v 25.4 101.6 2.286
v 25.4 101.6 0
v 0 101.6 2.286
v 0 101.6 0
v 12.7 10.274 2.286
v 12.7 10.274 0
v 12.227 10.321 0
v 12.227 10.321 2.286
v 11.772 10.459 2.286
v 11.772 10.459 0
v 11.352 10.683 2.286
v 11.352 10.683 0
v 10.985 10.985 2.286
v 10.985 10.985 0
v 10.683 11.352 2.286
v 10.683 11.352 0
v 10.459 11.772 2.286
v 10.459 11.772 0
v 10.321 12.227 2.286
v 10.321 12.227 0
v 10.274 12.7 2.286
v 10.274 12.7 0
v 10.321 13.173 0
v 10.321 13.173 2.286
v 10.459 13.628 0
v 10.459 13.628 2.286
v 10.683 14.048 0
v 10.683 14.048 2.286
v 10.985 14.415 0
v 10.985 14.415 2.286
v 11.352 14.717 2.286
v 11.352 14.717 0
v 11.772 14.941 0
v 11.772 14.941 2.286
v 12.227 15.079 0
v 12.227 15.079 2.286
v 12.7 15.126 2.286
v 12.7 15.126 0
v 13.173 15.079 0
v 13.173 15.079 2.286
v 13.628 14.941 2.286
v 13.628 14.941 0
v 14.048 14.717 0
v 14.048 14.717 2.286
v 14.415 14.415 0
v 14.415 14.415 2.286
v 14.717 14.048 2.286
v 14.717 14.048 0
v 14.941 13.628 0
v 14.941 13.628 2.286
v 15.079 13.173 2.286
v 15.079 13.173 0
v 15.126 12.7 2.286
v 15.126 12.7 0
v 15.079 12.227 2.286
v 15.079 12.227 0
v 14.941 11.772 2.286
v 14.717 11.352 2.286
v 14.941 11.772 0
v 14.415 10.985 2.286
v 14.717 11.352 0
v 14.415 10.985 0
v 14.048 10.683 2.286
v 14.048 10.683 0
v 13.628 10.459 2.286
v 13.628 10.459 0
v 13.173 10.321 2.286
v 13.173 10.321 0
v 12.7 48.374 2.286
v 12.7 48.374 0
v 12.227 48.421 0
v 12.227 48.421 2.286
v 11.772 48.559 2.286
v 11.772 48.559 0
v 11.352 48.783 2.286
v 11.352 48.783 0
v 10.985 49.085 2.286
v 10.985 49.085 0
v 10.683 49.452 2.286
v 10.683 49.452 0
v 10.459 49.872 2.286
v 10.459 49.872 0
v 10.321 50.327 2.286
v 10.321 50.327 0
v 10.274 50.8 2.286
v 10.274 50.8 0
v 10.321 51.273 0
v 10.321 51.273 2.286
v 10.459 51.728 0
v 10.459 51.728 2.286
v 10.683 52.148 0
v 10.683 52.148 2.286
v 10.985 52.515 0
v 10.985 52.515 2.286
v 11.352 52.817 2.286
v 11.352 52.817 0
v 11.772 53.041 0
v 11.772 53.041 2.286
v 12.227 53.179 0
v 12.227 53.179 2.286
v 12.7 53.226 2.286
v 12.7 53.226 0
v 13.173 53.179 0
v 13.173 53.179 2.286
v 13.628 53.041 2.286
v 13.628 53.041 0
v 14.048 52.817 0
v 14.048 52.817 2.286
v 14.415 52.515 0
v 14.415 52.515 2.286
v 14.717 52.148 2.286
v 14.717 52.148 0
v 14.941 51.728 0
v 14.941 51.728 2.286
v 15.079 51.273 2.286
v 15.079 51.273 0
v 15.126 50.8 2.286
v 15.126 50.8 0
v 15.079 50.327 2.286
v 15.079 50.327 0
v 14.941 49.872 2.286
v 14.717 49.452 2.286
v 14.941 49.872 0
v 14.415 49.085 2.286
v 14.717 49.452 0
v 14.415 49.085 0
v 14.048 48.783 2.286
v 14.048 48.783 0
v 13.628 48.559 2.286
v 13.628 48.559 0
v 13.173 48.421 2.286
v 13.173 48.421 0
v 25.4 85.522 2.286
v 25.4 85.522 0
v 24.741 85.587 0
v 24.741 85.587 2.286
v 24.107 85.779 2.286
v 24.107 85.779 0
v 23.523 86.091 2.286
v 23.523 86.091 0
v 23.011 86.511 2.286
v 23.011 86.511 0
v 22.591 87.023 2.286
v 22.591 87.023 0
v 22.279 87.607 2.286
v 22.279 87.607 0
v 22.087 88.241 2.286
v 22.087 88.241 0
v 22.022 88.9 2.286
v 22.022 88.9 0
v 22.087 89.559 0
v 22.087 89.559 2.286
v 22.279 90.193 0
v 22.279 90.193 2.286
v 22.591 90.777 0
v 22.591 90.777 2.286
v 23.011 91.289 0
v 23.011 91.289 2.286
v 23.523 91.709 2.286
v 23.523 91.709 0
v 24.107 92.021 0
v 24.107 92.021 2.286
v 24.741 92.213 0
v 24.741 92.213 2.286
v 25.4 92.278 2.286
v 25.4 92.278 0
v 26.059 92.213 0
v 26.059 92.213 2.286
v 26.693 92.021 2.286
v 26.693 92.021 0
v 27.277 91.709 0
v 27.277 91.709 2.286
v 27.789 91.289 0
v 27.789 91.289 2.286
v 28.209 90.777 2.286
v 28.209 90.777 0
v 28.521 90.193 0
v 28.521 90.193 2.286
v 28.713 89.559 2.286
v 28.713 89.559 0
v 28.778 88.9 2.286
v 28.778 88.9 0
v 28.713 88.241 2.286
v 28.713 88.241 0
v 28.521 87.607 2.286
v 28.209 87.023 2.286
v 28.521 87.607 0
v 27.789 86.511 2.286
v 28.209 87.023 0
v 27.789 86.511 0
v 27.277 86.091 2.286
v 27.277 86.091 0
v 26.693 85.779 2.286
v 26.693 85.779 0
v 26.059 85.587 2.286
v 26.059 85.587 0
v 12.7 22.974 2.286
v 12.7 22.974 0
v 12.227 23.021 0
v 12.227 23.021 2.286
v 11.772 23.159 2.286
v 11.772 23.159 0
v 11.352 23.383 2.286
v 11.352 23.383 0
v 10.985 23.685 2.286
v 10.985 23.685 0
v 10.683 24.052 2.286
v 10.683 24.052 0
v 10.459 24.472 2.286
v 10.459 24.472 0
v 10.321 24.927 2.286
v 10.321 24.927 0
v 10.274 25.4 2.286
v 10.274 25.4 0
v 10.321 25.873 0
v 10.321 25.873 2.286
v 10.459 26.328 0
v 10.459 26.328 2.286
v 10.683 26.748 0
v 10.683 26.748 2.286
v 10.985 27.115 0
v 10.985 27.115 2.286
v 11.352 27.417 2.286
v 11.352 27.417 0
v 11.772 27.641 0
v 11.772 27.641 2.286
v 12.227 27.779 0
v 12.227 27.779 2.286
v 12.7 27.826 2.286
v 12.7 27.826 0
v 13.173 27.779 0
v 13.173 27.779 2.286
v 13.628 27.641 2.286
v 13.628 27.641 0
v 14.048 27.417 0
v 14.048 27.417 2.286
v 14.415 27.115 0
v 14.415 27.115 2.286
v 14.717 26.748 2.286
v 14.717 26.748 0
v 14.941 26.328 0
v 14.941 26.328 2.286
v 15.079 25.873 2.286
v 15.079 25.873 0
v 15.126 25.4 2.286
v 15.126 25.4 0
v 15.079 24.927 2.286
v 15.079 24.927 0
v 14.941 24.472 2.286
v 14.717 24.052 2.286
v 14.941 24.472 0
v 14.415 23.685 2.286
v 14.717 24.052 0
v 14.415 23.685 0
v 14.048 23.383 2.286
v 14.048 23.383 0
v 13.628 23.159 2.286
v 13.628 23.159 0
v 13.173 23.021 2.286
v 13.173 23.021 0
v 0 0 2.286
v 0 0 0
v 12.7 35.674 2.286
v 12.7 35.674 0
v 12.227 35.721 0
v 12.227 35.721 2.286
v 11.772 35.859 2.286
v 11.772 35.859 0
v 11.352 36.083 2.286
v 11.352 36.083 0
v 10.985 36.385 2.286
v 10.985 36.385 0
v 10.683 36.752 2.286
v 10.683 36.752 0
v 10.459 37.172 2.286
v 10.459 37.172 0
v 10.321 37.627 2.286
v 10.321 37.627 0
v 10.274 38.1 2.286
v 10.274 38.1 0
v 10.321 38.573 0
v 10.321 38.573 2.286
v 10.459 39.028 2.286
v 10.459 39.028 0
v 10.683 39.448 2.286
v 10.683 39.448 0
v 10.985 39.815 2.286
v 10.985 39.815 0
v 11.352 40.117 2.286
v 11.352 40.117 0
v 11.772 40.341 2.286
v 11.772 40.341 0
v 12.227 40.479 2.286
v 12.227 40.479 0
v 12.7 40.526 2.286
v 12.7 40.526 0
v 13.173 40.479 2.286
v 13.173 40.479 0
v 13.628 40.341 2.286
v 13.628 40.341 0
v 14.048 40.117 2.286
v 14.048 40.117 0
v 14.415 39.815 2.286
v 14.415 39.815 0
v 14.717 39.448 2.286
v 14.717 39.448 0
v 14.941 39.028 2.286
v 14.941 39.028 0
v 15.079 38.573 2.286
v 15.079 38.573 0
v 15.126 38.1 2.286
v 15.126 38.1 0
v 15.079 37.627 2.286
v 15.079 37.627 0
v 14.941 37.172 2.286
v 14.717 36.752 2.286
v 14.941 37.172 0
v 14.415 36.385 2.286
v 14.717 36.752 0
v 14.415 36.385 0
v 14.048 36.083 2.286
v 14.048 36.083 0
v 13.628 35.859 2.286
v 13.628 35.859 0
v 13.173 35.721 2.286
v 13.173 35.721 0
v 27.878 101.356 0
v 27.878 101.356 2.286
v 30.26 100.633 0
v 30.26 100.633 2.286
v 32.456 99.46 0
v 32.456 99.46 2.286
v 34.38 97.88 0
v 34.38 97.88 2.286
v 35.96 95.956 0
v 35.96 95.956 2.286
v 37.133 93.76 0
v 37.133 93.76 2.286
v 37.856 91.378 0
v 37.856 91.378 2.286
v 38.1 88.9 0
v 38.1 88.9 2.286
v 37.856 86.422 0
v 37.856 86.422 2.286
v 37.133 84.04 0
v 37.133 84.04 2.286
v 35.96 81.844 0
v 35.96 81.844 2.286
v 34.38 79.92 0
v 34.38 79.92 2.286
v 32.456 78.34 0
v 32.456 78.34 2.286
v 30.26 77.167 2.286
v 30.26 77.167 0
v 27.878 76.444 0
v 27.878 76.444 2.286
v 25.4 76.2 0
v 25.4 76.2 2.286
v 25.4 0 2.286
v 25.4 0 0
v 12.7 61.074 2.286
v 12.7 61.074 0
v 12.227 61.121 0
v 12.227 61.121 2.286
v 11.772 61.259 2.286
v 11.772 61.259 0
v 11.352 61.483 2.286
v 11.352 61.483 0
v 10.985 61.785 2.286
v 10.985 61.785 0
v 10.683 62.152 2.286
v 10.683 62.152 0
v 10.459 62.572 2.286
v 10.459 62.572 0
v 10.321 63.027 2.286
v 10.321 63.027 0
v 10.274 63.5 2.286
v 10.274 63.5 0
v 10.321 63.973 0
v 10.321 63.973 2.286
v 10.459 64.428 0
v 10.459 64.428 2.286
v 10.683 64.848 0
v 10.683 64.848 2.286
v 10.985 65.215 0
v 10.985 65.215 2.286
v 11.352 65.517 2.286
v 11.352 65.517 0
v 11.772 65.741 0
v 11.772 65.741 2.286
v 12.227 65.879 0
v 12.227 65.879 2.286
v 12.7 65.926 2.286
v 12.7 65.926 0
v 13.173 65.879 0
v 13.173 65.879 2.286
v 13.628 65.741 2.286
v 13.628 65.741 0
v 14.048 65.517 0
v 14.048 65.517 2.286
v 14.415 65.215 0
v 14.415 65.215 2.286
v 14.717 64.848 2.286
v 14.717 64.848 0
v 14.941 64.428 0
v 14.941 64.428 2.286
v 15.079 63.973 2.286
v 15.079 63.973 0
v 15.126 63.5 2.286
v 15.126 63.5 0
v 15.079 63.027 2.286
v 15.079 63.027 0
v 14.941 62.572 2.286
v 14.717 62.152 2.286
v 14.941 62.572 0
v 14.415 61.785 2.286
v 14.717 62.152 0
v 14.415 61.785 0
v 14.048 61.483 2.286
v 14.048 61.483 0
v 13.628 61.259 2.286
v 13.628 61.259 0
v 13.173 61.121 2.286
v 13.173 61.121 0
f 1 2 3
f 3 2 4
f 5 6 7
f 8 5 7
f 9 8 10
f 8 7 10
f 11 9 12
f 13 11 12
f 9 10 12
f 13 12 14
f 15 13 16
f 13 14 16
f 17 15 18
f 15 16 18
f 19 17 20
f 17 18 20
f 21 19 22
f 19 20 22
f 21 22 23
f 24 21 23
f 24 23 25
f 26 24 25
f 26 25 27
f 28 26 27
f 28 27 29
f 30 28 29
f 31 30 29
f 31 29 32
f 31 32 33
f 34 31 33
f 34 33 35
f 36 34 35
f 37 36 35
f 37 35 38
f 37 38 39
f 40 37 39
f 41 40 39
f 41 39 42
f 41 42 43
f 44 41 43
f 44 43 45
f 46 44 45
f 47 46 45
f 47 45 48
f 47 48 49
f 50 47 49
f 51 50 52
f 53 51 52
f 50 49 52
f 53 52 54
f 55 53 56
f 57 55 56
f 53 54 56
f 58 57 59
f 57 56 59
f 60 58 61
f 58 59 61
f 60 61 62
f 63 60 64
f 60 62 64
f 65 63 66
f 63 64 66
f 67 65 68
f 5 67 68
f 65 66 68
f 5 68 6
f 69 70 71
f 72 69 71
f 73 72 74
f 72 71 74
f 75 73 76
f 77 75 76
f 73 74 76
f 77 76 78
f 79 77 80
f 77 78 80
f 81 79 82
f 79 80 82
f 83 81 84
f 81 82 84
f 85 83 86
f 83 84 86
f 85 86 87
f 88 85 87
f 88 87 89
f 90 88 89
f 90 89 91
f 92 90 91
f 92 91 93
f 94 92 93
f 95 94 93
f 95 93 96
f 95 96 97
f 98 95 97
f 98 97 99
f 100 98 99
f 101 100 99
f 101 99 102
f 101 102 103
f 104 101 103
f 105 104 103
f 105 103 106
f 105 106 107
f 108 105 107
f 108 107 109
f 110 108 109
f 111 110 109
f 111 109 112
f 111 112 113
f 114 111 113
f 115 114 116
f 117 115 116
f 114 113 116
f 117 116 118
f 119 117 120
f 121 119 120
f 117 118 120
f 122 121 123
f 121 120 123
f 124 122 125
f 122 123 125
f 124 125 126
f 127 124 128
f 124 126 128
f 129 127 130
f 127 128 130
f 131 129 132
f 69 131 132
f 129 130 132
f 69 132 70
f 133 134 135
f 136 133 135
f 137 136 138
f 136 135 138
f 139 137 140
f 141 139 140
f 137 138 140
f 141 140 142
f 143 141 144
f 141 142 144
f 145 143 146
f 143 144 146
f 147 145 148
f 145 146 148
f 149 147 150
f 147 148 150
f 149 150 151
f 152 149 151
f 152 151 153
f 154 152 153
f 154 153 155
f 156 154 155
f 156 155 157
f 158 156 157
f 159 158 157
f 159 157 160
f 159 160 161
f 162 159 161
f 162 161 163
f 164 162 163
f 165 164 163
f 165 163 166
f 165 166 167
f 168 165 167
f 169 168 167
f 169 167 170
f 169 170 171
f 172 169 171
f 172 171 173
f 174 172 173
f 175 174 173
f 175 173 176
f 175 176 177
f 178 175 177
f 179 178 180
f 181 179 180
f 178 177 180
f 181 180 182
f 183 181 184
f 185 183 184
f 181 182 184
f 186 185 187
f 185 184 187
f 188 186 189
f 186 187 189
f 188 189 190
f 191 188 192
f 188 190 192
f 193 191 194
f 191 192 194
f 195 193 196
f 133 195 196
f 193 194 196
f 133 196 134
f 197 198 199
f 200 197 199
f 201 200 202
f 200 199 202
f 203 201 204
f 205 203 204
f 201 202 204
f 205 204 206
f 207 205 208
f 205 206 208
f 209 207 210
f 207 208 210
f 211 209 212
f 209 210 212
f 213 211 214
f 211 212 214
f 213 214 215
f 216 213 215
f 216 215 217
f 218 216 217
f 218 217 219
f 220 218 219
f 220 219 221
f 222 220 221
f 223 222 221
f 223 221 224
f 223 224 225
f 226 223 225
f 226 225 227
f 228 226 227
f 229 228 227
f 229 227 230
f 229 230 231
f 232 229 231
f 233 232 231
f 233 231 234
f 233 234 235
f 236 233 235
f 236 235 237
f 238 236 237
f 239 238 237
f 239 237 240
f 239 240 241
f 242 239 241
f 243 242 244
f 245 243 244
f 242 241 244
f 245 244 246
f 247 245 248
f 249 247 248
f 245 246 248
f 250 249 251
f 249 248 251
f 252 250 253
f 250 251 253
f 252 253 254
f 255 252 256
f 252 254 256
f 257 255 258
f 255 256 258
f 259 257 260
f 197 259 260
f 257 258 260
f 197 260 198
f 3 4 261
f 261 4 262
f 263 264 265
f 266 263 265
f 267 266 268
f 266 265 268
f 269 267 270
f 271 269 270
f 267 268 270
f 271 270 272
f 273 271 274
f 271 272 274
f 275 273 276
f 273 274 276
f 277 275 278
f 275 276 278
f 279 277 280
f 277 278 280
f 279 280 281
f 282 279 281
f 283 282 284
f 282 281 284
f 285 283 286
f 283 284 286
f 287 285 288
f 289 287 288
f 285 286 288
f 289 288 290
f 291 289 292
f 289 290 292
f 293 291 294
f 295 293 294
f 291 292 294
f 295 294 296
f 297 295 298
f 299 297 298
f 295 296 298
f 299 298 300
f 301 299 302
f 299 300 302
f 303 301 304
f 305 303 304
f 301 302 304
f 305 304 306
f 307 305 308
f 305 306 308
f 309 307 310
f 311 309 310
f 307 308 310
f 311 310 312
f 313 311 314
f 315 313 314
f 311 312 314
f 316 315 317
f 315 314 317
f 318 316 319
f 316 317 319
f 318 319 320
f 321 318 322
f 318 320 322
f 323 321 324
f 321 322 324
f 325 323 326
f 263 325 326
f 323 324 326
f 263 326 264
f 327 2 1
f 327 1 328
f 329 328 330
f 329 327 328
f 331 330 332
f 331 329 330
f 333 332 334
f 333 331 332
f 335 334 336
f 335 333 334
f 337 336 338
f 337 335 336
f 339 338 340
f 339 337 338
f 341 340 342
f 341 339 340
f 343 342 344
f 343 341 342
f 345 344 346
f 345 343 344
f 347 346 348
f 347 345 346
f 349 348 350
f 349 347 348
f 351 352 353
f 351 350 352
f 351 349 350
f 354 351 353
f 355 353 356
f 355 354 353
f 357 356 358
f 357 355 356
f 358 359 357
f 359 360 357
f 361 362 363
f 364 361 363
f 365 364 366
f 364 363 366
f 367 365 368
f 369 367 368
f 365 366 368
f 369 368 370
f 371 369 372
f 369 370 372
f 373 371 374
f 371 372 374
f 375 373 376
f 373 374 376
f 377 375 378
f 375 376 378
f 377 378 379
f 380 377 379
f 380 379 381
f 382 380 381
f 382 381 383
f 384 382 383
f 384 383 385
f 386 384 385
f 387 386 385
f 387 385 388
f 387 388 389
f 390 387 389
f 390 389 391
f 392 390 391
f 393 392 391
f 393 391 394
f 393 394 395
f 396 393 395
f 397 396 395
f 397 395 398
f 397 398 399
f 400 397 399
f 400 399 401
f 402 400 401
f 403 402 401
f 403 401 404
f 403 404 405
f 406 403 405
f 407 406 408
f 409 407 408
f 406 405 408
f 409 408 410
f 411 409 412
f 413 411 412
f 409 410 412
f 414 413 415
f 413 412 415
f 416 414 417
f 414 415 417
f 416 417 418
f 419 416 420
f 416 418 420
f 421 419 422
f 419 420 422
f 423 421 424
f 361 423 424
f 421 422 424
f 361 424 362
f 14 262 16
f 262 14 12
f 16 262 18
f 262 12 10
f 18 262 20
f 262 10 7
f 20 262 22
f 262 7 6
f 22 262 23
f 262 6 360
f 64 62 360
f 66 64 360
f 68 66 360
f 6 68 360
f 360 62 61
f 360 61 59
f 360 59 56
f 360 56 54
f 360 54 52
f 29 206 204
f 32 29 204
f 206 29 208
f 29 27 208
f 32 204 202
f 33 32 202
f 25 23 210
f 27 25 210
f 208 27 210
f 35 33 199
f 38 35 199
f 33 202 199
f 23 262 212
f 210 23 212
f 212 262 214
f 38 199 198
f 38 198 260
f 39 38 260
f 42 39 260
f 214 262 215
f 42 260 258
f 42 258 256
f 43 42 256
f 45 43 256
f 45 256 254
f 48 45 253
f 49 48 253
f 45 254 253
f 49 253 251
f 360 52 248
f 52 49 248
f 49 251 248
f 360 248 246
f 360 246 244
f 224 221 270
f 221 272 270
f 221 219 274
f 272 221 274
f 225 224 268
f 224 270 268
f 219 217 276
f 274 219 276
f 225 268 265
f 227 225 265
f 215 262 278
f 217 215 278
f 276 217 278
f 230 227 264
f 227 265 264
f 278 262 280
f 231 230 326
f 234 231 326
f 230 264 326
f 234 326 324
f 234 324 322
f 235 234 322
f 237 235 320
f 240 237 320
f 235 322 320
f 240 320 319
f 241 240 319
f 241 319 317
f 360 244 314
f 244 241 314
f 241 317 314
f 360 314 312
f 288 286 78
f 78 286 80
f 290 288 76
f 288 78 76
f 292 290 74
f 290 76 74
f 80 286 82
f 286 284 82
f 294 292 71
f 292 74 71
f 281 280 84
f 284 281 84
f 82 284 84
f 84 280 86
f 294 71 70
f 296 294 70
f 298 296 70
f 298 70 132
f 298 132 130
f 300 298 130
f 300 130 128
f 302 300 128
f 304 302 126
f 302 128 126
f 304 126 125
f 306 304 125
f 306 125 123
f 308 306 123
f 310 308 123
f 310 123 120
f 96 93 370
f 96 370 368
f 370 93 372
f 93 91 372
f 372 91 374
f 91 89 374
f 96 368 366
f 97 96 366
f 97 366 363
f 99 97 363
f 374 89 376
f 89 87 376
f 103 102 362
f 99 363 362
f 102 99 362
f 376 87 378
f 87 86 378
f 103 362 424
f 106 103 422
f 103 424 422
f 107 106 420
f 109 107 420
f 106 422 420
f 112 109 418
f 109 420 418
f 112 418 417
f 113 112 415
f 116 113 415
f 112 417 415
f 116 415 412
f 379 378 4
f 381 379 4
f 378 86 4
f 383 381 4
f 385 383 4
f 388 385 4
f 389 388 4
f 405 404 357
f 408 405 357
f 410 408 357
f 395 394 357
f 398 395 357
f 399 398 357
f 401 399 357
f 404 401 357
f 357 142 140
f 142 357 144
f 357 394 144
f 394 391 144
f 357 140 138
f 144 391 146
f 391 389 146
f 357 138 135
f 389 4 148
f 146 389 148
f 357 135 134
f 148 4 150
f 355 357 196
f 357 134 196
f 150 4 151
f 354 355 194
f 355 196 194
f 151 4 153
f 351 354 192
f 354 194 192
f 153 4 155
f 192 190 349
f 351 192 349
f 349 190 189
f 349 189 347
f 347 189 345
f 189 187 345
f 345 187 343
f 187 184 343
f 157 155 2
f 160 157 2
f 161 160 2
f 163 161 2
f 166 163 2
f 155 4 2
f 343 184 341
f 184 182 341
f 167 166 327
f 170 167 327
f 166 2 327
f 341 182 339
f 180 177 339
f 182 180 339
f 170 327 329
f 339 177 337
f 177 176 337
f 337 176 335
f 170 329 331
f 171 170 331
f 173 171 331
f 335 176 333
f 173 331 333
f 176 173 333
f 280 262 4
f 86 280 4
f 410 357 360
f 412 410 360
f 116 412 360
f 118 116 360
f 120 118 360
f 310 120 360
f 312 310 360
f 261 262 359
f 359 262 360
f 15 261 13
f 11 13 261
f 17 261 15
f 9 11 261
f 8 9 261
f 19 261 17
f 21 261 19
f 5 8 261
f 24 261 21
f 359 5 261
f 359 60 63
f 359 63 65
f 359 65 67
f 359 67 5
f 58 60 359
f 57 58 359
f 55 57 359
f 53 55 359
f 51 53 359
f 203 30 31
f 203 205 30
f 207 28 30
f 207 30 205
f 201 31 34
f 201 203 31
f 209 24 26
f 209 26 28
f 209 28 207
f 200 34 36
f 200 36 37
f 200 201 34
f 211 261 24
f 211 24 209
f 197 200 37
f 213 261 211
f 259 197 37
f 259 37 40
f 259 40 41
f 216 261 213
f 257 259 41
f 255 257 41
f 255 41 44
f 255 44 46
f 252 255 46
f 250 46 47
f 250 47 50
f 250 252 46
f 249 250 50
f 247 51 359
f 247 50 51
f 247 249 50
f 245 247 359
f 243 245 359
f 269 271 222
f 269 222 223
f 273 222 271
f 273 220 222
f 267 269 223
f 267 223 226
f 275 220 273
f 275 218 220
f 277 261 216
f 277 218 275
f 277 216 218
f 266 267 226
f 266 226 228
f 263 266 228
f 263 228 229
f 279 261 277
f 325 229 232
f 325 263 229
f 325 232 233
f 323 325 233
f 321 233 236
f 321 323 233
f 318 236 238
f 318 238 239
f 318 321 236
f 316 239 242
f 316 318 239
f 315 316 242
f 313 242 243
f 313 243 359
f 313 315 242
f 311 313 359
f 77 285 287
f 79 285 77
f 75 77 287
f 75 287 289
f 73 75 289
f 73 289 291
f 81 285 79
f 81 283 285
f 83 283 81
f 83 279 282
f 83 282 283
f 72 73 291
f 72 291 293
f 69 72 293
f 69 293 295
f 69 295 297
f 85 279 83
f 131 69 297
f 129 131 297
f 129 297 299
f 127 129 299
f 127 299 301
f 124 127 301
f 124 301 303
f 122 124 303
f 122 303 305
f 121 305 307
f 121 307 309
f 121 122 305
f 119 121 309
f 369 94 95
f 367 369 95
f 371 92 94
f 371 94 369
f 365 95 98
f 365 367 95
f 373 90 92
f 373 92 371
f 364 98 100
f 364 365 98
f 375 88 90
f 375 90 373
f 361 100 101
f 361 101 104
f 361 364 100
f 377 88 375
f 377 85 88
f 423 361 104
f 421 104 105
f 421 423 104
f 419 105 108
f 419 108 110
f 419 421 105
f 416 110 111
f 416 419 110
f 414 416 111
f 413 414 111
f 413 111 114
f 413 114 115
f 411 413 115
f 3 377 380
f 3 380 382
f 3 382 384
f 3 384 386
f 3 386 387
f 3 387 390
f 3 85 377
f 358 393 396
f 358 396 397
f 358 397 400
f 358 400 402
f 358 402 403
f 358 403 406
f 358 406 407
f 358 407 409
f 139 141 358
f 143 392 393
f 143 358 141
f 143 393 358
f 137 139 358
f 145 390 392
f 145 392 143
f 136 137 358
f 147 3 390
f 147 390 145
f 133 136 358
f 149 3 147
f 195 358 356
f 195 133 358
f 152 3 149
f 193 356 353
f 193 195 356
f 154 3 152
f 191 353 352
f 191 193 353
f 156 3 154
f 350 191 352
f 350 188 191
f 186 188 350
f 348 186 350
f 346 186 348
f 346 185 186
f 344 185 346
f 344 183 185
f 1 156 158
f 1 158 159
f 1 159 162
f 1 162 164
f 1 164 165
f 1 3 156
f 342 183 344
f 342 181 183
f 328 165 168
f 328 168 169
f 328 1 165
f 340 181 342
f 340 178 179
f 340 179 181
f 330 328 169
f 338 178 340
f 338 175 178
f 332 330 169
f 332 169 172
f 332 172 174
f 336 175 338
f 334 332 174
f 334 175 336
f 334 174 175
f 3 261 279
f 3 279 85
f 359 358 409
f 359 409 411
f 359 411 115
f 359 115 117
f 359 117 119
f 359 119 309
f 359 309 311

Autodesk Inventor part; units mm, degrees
ref_plane "YZ Plane" through (0, 0, 0) normal (1, 0, 0) x (0, 1, 0)
ref_plane "XZ Plane" through (0, 0, 0) normal (0, 1, 0) x (-1, 0, 0)
ref_plane "XY Plane" through (0, 0, 0) normal (0, 0, 1) x (1, 0, 0)
sketch "Sketch1" plane through (0, 0, 0) normal (0, 0, 1) x (1, 0, 0)
  line L0 (0, 0) -> (25.4, 0)
  line L1 (25.4, 0) -> (25.4, 101.6)
  line L2 (25.4, 101.6) -> (0, 101.6)
  line L3 (0, 101.6) -> (0, 0)
  arc A0 (25.4, 76.2) -> (25.4, 101.6) centre (25.4, 88.9) ccw
  dimension "d0" = 101.6
  dimension "d1" = 25.4
  dimension "d2" = 25.4
extrude "Extrusion1" add sketch "Sketch1" along normal blind 2.286
sketch "Sketch3" plane through (0, 0, 2.286) normal (0, 0, 1) x (1, 0, 0)
  line L0 (0, 101.6) -> (0, 0) projected
  line L1 (0, 0) -> (25.4, 0) projected
  line L2 (25.4, 101.6) -> (0, 101.6) projected
  point P0 (12.7, 63.5)
  point P1 (12.7, 50.8)
  point P2 (12.7, 38.1)
  point P3 (12.7, 25.4)
  point P4 (12.7, 12.7)
  dimension "d39" = 38.1
  dimension "d40" = 12.7
  dimension "d43" = 12.7
hole "Hole1" at (12.7, 63.5, 2.286) at (12.7, 50.8, 2.286) at (12.7, 38.1, 2.286) at (12.7, 25.4, 2.286) at (12.7, 12.7, 2.286) direction (0, 0, -1) diameter 4.8514 end through all
sketch "Sketch4" plane through (0, 0, 2.286) normal (0, 0, 1) x (1, 0, 0)
  line L0 (25.4, 0) -> (25.4, 76.2) projected
  arc A0 (25.4, 76.2) -> (25.4, 101.6) centre (25.4, 88.9) ccw projected
  point P0 (0, 0)
hole "Hole2" at (25.4, 88.9, 2.286) direction (0, 0, -1) diameter 6.7564 end through all clearance for "Flat Head Machine Screw (82)" size "1/4" standard "Ansi Unified Screw Threads"
equation "\"d2\" = d1"
properties part number "Lifter Bracket" material "Aluminum 6061"
